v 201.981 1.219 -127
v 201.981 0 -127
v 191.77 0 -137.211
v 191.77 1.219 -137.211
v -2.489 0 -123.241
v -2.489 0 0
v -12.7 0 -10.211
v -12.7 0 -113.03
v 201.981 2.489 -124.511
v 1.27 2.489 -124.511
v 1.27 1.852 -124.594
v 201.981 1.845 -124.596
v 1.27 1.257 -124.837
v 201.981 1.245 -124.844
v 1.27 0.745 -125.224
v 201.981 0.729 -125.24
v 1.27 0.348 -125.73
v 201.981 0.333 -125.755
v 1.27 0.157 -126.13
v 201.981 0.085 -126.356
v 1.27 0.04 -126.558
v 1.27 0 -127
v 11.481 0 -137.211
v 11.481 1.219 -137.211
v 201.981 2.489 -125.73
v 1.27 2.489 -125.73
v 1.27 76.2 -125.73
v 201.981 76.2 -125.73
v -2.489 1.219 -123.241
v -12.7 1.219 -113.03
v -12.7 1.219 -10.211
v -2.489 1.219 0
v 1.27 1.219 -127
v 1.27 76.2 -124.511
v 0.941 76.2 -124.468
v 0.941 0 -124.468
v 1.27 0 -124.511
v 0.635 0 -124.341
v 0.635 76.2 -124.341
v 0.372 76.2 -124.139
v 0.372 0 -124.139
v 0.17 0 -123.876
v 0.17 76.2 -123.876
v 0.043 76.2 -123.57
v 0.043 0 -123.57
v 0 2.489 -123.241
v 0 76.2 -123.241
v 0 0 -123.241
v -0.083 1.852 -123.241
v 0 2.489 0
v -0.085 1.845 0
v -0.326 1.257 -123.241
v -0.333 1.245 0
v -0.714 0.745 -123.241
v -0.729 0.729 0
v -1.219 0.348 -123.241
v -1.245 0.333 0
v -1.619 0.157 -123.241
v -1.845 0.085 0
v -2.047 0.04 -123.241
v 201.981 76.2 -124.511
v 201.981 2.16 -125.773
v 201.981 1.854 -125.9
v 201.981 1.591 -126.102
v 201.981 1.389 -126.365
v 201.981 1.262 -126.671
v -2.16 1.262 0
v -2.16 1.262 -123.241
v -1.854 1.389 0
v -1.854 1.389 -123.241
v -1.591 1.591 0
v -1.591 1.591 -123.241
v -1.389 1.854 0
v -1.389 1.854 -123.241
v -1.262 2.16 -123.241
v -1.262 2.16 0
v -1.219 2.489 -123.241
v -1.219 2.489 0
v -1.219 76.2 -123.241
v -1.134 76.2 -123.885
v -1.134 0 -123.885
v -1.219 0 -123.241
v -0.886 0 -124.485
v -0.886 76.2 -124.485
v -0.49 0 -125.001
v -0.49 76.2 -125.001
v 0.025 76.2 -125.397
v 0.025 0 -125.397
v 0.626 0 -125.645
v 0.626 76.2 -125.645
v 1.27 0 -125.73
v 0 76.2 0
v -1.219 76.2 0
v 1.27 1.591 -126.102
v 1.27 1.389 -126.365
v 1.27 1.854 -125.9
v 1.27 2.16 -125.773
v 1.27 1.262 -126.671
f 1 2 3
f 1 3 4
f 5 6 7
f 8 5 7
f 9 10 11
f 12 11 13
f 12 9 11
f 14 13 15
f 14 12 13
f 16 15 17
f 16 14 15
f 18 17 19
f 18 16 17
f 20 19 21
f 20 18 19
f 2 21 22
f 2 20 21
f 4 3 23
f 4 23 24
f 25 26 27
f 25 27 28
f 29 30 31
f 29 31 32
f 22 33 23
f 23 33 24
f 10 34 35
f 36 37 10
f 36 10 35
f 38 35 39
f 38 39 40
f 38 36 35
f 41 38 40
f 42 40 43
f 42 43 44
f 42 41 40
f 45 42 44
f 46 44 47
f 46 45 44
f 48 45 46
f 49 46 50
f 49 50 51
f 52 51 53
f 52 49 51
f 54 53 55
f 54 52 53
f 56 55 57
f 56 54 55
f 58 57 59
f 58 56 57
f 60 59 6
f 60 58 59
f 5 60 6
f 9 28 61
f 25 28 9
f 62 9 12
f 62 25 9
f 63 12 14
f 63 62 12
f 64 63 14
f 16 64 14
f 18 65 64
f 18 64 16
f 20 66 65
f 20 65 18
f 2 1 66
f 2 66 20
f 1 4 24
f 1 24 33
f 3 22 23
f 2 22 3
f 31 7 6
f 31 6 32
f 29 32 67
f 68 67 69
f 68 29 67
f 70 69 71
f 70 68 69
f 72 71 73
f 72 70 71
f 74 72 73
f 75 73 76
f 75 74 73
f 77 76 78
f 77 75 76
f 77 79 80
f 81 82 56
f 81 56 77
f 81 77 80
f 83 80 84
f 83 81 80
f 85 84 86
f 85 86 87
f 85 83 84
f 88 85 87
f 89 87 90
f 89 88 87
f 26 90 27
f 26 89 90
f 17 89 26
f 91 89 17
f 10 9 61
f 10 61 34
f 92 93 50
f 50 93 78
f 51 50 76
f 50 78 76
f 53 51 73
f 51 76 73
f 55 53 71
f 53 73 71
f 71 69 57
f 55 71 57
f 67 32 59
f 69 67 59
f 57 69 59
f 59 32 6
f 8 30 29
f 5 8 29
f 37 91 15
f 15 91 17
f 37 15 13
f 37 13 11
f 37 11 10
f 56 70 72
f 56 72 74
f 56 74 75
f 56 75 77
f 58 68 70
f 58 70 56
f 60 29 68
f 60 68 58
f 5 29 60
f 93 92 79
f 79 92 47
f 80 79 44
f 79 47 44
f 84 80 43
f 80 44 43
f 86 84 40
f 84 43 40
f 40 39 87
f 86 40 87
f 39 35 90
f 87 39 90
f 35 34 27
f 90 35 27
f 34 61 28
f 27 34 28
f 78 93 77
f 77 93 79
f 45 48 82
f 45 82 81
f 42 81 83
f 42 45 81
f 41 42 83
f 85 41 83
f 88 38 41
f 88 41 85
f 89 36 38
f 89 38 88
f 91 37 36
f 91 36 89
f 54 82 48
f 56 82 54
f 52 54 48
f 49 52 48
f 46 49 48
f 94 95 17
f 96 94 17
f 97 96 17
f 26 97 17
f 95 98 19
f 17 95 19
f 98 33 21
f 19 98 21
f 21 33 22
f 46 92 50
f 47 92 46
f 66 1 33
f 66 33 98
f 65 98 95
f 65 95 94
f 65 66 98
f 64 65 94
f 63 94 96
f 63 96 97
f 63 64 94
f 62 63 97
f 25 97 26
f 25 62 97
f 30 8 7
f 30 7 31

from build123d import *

# Parameters (mm, degrees)
SKETCH1_W                    = 125.73
SKETCH1_H                    = 76.2
BASE_FLANGE1_DEPTH           = 1.2192
EDGE_FLANGE1_STRIP_W         = 7.4168
EDGE_FLANGE1_STRIP_H         = 1.2192
EDGE_FLANGE1_STRIP_CUT_DEPTH = 76.2
EDGE_FLANGE1_DEPTH           = 76.2
EDGE_FLANGE2_STRIP_W         = 7.4168
EDGE_FLANGE2_STRIP_H         = 1.2192
EDGE_FLANGE2_STRIP_CUT_DEPTH = 123.2408
EDGE_FLANGE2_DEPTH           = 123.2408
EDGE_FLANGE3_STRIP_W         = 7.4168
EDGE_FLANGE3_STRIP_H         = 1.2192
EDGE_FLANGE3_STRIP_CUT_DEPTH = 200.7108
EDGE_FLANGE3_DEPTH           = 200.7108
BREAK_CORNER5_START          = -96.12466152
BREAK_CORNER5_OUTLINE_W      = 143.62455456
BREAK_CORNER5_OUTLINE_H      = 4
BREAK_CORNER5_DEPTH          = 7.220125921
BREAK_CORNER5_START_2        = 38.579180296
BREAK_CORNER5_2_OUTLINE_W    = 8.37544544
BREAK_CORNER5_2_OUTLINE_H    = 4
BREAK_CORNER5_2_DEPTH        = 14.440251843
BREAK_CORNER6_START          = -96.12466152
BREAK_CORNER6_OUTLINE_W      = 88.7601302
BREAK_CORNER6_OUTLINE_H      = 4
BREAK_CORNER6_DEPTH          = 7.220125921
BREAK_CORNER6_START_2        = -16.200382042
BREAK_CORNER6_2_OUTLINE_W    = 8.2398698
BREAK_CORNER6_2_OUTLINE_H    = 4
BREAK_CORNER6_2_DEPTH        = 14.440251842


# Read off the part's stored shape, not the designer's step: Break-Corner5, Break-Corner6
# Sheet-metal steps are written as plain solids
with BuildPart() as part:
    # Sketch1 → Base-Flange1 (new body)
    with BuildSketch(Plane(origin=(0, 0, 0), x_dir=(0, 0, -1), z_dir=(1, 0, 0))):
        with Locations((62.865, 38.1)):
            Rectangle(SKETCH1_W, SKETCH1_H)
    extrude(amount=-BASE_FLANGE1_DEPTH)

    # Edge-Flange1 strip (across the edge) → Edge-Flange1 strip cut (cut)
    with BuildSketch(Plane(origin=(0, 0, -125.73), x_dir=(0, 0, 1), z_dir=(0, 1, 0))):
        with Locations((-1.2192, -0.6096)):
            Rectangle(EDGE_FLANGE1_STRIP_W, EDGE_FLANGE1_STRIP_H)
    extrude(amount=EDGE_FLANGE1_STRIP_CUT_DEPTH, mode=Mode.SUBTRACT)

    # Edge-Flange1 section (across the edge) → Edge-Flange1 (add)
    with BuildSketch(Plane(origin=(0, 0, -125.73), x_dir=(0, 0, 1), z_dir=(0, 1, 0))):
        with BuildLine():
            Line((0, 1.27), (0, 201.9808))
            Line((0, 201.9808), (1.2192, 201.9808))
            Line((1.2192, 201.9808), (1.2192, 1.27))
            ThreePointArc((1.2192, 1.27), (1.591174388, 0.371974388), (2.4892, 0))
            Line((2.4892, 0), (2.4892, -1.2192))
            ThreePointArc((2.4892, -1.2192), (0.7290698, -0.4901302), (0, 1.27))
        make_face()
    extrude(amount=EDGE_FLANGE1_DEPTH)

    # Edge-Flange2 strip (across the edge) → Edge-Flange2 strip cut (cut)
    with BuildSketch(Plane(origin=(-1.2192, 0, -123.2408), x_dir=(0, 1, 0), z_dir=(0, 0, 1))):
        with Locations((-1.2192, -0.6096)):
            Rectangle(EDGE_FLANGE2_STRIP_W, EDGE_FLANGE2_STRIP_H)
    extrude(amount=EDGE_FLANGE2_STRIP_CUT_DEPTH, mode=Mode.SUBTRACT)

    # Edge-Flange2 section (across the edge) → Edge-Flange2 (add)
    with BuildSketch(Plane(origin=(-1.2192, 0, -123.2408), x_dir=(0, 1, 0), z_dir=(0, 0, 1))):
        with BuildLine():
            Line((0, 1.27), (0, 11.4808))
            Line((0, 11.4808), (1.2192, 11.4808))
            Line((1.2192, 11.4808), (1.2192, 1.27))
            ThreePointArc((1.2192, 1.27), (1.591174388, 0.371974388), (2.4892, 0))
            Line((2.4892, 0), (2.4892, -1.2192))
            ThreePointArc((2.4892, -1.2192), (0.7290698, -0.4901302), (0, 1.27))
        make_face()
    extrude(amount=EDGE_FLANGE2_DEPTH)

    # Edge-Flange3 strip (across the edge) → Edge-Flange3 strip cut (cut)
    with BuildSketch(Plane(origin=(201.9808, 0, -125.73), x_dir=(0, 1, 0), z_dir=(-1, 0, 0))):
        with Locations((-1.2192, -0.6096)):
            Rectangle(EDGE_FLANGE3_STRIP_W, EDGE_FLANGE3_STRIP_H)
    extrude(amount=EDGE_FLANGE3_STRIP_CUT_DEPTH, mode=Mode.SUBTRACT)

    # Edge-Flange3 section (across the edge) → Edge-Flange3 (add)
    with BuildSketch(Plane(origin=(201.9808, 0, -125.73), x_dir=(0, 1, 0), z_dir=(-1, 0, 0))):
        with BuildLine():
            Line((0, 1.27), (0, 11.4808))
            Line((0, 11.4808), (1.2192, 11.4808))
            Line((1.2192, 11.4808), (1.2192, 1.27))
            ThreePointArc((1.2192, 1.27), (1.591174388, 0.371974388), (2.4892, 0))
            Line((2.4892, 0), (2.4892, -1.2192))
            ThreePointArc((2.4892, -1.2192), (0.7290698, -0.4901302), (0, 1.27))
        make_face()
    extrude(amount=EDGE_FLANGE3_DEPTH)

    # Break-Corner5 outline → Break-Corner5 (cut)
    with BuildSketch(Plane(origin=(0, 0, 0), x_dir=(0.707106781186546, 0, -0.707106781186549), z_dir=(0.707106781186549, 0, 0.707106781186546)).offset(BREAK_CORNER5_START)):
        with Locations((160.81227728, 1)):
            Rectangle(BREAK_CORNER5_OUTLINE_W, BREAK_CORNER5_OUTLINE_H)
    extrude(amount=BREAK_CORNER5_DEPTH, mode=Mode.SUBTRACT)

    # Break-Corner5 2 outline → Break-Corner5 2 (cut)
    with BuildSketch(Plane(origin=(0, 0, 0), x_dir=(0.707106781186546, 0, -0.707106781186549), z_dir=(0.707106781186549, 0, 0.707106781186546)).offset(BREAK_CORNER5_START_2)):
        with Locations((236.81227728, 1)):
            Rectangle(BREAK_CORNER5_2_OUTLINE_W, BREAK_CORNER5_2_OUTLINE_H)
    extrude(amount=BREAK_CORNER5_2_DEPTH, mode=Mode.SUBTRACT)

    # Break-Corner6 outline → Break-Corner6 (cut)
    with BuildSketch(Plane(origin=(0, 0, 0), x_dir=(0.7071067811865471, 0, -0.707106781186548), z_dir=(0.707106781186548, 0, 0.707106781186547)).offset(BREAK_CORNER6_START)):
        with Locations((42.6199349, 1)):
            Rectangle(BREAK_CORNER6_OUTLINE_W, BREAK_CORNER6_OUTLINE_H)
    extrude(amount=BREAK_CORNER6_DEPTH, mode=Mode.SUBTRACT)

    # Break-Corner6 2 outline → Break-Corner6 2 (cut)
    with BuildSketch(Plane(origin=(0, 0, 0), x_dir=(0.7071067811865471, 0, -0.707106781186548), z_dir=(0.707106781186548, 0, 0.707106781186547)).offset(BREAK_CORNER6_START_2)):
        with Locations((-5.8800651, 1)):
            Rectangle(BREAK_CORNER6_2_OUTLINE_W, BREAK_CORNER6_2_OUTLINE_H)
    extrude(amount=BREAK_CORNER6_2_DEPTH, mode=Mode.SUBTRACT)


solid = part.part
